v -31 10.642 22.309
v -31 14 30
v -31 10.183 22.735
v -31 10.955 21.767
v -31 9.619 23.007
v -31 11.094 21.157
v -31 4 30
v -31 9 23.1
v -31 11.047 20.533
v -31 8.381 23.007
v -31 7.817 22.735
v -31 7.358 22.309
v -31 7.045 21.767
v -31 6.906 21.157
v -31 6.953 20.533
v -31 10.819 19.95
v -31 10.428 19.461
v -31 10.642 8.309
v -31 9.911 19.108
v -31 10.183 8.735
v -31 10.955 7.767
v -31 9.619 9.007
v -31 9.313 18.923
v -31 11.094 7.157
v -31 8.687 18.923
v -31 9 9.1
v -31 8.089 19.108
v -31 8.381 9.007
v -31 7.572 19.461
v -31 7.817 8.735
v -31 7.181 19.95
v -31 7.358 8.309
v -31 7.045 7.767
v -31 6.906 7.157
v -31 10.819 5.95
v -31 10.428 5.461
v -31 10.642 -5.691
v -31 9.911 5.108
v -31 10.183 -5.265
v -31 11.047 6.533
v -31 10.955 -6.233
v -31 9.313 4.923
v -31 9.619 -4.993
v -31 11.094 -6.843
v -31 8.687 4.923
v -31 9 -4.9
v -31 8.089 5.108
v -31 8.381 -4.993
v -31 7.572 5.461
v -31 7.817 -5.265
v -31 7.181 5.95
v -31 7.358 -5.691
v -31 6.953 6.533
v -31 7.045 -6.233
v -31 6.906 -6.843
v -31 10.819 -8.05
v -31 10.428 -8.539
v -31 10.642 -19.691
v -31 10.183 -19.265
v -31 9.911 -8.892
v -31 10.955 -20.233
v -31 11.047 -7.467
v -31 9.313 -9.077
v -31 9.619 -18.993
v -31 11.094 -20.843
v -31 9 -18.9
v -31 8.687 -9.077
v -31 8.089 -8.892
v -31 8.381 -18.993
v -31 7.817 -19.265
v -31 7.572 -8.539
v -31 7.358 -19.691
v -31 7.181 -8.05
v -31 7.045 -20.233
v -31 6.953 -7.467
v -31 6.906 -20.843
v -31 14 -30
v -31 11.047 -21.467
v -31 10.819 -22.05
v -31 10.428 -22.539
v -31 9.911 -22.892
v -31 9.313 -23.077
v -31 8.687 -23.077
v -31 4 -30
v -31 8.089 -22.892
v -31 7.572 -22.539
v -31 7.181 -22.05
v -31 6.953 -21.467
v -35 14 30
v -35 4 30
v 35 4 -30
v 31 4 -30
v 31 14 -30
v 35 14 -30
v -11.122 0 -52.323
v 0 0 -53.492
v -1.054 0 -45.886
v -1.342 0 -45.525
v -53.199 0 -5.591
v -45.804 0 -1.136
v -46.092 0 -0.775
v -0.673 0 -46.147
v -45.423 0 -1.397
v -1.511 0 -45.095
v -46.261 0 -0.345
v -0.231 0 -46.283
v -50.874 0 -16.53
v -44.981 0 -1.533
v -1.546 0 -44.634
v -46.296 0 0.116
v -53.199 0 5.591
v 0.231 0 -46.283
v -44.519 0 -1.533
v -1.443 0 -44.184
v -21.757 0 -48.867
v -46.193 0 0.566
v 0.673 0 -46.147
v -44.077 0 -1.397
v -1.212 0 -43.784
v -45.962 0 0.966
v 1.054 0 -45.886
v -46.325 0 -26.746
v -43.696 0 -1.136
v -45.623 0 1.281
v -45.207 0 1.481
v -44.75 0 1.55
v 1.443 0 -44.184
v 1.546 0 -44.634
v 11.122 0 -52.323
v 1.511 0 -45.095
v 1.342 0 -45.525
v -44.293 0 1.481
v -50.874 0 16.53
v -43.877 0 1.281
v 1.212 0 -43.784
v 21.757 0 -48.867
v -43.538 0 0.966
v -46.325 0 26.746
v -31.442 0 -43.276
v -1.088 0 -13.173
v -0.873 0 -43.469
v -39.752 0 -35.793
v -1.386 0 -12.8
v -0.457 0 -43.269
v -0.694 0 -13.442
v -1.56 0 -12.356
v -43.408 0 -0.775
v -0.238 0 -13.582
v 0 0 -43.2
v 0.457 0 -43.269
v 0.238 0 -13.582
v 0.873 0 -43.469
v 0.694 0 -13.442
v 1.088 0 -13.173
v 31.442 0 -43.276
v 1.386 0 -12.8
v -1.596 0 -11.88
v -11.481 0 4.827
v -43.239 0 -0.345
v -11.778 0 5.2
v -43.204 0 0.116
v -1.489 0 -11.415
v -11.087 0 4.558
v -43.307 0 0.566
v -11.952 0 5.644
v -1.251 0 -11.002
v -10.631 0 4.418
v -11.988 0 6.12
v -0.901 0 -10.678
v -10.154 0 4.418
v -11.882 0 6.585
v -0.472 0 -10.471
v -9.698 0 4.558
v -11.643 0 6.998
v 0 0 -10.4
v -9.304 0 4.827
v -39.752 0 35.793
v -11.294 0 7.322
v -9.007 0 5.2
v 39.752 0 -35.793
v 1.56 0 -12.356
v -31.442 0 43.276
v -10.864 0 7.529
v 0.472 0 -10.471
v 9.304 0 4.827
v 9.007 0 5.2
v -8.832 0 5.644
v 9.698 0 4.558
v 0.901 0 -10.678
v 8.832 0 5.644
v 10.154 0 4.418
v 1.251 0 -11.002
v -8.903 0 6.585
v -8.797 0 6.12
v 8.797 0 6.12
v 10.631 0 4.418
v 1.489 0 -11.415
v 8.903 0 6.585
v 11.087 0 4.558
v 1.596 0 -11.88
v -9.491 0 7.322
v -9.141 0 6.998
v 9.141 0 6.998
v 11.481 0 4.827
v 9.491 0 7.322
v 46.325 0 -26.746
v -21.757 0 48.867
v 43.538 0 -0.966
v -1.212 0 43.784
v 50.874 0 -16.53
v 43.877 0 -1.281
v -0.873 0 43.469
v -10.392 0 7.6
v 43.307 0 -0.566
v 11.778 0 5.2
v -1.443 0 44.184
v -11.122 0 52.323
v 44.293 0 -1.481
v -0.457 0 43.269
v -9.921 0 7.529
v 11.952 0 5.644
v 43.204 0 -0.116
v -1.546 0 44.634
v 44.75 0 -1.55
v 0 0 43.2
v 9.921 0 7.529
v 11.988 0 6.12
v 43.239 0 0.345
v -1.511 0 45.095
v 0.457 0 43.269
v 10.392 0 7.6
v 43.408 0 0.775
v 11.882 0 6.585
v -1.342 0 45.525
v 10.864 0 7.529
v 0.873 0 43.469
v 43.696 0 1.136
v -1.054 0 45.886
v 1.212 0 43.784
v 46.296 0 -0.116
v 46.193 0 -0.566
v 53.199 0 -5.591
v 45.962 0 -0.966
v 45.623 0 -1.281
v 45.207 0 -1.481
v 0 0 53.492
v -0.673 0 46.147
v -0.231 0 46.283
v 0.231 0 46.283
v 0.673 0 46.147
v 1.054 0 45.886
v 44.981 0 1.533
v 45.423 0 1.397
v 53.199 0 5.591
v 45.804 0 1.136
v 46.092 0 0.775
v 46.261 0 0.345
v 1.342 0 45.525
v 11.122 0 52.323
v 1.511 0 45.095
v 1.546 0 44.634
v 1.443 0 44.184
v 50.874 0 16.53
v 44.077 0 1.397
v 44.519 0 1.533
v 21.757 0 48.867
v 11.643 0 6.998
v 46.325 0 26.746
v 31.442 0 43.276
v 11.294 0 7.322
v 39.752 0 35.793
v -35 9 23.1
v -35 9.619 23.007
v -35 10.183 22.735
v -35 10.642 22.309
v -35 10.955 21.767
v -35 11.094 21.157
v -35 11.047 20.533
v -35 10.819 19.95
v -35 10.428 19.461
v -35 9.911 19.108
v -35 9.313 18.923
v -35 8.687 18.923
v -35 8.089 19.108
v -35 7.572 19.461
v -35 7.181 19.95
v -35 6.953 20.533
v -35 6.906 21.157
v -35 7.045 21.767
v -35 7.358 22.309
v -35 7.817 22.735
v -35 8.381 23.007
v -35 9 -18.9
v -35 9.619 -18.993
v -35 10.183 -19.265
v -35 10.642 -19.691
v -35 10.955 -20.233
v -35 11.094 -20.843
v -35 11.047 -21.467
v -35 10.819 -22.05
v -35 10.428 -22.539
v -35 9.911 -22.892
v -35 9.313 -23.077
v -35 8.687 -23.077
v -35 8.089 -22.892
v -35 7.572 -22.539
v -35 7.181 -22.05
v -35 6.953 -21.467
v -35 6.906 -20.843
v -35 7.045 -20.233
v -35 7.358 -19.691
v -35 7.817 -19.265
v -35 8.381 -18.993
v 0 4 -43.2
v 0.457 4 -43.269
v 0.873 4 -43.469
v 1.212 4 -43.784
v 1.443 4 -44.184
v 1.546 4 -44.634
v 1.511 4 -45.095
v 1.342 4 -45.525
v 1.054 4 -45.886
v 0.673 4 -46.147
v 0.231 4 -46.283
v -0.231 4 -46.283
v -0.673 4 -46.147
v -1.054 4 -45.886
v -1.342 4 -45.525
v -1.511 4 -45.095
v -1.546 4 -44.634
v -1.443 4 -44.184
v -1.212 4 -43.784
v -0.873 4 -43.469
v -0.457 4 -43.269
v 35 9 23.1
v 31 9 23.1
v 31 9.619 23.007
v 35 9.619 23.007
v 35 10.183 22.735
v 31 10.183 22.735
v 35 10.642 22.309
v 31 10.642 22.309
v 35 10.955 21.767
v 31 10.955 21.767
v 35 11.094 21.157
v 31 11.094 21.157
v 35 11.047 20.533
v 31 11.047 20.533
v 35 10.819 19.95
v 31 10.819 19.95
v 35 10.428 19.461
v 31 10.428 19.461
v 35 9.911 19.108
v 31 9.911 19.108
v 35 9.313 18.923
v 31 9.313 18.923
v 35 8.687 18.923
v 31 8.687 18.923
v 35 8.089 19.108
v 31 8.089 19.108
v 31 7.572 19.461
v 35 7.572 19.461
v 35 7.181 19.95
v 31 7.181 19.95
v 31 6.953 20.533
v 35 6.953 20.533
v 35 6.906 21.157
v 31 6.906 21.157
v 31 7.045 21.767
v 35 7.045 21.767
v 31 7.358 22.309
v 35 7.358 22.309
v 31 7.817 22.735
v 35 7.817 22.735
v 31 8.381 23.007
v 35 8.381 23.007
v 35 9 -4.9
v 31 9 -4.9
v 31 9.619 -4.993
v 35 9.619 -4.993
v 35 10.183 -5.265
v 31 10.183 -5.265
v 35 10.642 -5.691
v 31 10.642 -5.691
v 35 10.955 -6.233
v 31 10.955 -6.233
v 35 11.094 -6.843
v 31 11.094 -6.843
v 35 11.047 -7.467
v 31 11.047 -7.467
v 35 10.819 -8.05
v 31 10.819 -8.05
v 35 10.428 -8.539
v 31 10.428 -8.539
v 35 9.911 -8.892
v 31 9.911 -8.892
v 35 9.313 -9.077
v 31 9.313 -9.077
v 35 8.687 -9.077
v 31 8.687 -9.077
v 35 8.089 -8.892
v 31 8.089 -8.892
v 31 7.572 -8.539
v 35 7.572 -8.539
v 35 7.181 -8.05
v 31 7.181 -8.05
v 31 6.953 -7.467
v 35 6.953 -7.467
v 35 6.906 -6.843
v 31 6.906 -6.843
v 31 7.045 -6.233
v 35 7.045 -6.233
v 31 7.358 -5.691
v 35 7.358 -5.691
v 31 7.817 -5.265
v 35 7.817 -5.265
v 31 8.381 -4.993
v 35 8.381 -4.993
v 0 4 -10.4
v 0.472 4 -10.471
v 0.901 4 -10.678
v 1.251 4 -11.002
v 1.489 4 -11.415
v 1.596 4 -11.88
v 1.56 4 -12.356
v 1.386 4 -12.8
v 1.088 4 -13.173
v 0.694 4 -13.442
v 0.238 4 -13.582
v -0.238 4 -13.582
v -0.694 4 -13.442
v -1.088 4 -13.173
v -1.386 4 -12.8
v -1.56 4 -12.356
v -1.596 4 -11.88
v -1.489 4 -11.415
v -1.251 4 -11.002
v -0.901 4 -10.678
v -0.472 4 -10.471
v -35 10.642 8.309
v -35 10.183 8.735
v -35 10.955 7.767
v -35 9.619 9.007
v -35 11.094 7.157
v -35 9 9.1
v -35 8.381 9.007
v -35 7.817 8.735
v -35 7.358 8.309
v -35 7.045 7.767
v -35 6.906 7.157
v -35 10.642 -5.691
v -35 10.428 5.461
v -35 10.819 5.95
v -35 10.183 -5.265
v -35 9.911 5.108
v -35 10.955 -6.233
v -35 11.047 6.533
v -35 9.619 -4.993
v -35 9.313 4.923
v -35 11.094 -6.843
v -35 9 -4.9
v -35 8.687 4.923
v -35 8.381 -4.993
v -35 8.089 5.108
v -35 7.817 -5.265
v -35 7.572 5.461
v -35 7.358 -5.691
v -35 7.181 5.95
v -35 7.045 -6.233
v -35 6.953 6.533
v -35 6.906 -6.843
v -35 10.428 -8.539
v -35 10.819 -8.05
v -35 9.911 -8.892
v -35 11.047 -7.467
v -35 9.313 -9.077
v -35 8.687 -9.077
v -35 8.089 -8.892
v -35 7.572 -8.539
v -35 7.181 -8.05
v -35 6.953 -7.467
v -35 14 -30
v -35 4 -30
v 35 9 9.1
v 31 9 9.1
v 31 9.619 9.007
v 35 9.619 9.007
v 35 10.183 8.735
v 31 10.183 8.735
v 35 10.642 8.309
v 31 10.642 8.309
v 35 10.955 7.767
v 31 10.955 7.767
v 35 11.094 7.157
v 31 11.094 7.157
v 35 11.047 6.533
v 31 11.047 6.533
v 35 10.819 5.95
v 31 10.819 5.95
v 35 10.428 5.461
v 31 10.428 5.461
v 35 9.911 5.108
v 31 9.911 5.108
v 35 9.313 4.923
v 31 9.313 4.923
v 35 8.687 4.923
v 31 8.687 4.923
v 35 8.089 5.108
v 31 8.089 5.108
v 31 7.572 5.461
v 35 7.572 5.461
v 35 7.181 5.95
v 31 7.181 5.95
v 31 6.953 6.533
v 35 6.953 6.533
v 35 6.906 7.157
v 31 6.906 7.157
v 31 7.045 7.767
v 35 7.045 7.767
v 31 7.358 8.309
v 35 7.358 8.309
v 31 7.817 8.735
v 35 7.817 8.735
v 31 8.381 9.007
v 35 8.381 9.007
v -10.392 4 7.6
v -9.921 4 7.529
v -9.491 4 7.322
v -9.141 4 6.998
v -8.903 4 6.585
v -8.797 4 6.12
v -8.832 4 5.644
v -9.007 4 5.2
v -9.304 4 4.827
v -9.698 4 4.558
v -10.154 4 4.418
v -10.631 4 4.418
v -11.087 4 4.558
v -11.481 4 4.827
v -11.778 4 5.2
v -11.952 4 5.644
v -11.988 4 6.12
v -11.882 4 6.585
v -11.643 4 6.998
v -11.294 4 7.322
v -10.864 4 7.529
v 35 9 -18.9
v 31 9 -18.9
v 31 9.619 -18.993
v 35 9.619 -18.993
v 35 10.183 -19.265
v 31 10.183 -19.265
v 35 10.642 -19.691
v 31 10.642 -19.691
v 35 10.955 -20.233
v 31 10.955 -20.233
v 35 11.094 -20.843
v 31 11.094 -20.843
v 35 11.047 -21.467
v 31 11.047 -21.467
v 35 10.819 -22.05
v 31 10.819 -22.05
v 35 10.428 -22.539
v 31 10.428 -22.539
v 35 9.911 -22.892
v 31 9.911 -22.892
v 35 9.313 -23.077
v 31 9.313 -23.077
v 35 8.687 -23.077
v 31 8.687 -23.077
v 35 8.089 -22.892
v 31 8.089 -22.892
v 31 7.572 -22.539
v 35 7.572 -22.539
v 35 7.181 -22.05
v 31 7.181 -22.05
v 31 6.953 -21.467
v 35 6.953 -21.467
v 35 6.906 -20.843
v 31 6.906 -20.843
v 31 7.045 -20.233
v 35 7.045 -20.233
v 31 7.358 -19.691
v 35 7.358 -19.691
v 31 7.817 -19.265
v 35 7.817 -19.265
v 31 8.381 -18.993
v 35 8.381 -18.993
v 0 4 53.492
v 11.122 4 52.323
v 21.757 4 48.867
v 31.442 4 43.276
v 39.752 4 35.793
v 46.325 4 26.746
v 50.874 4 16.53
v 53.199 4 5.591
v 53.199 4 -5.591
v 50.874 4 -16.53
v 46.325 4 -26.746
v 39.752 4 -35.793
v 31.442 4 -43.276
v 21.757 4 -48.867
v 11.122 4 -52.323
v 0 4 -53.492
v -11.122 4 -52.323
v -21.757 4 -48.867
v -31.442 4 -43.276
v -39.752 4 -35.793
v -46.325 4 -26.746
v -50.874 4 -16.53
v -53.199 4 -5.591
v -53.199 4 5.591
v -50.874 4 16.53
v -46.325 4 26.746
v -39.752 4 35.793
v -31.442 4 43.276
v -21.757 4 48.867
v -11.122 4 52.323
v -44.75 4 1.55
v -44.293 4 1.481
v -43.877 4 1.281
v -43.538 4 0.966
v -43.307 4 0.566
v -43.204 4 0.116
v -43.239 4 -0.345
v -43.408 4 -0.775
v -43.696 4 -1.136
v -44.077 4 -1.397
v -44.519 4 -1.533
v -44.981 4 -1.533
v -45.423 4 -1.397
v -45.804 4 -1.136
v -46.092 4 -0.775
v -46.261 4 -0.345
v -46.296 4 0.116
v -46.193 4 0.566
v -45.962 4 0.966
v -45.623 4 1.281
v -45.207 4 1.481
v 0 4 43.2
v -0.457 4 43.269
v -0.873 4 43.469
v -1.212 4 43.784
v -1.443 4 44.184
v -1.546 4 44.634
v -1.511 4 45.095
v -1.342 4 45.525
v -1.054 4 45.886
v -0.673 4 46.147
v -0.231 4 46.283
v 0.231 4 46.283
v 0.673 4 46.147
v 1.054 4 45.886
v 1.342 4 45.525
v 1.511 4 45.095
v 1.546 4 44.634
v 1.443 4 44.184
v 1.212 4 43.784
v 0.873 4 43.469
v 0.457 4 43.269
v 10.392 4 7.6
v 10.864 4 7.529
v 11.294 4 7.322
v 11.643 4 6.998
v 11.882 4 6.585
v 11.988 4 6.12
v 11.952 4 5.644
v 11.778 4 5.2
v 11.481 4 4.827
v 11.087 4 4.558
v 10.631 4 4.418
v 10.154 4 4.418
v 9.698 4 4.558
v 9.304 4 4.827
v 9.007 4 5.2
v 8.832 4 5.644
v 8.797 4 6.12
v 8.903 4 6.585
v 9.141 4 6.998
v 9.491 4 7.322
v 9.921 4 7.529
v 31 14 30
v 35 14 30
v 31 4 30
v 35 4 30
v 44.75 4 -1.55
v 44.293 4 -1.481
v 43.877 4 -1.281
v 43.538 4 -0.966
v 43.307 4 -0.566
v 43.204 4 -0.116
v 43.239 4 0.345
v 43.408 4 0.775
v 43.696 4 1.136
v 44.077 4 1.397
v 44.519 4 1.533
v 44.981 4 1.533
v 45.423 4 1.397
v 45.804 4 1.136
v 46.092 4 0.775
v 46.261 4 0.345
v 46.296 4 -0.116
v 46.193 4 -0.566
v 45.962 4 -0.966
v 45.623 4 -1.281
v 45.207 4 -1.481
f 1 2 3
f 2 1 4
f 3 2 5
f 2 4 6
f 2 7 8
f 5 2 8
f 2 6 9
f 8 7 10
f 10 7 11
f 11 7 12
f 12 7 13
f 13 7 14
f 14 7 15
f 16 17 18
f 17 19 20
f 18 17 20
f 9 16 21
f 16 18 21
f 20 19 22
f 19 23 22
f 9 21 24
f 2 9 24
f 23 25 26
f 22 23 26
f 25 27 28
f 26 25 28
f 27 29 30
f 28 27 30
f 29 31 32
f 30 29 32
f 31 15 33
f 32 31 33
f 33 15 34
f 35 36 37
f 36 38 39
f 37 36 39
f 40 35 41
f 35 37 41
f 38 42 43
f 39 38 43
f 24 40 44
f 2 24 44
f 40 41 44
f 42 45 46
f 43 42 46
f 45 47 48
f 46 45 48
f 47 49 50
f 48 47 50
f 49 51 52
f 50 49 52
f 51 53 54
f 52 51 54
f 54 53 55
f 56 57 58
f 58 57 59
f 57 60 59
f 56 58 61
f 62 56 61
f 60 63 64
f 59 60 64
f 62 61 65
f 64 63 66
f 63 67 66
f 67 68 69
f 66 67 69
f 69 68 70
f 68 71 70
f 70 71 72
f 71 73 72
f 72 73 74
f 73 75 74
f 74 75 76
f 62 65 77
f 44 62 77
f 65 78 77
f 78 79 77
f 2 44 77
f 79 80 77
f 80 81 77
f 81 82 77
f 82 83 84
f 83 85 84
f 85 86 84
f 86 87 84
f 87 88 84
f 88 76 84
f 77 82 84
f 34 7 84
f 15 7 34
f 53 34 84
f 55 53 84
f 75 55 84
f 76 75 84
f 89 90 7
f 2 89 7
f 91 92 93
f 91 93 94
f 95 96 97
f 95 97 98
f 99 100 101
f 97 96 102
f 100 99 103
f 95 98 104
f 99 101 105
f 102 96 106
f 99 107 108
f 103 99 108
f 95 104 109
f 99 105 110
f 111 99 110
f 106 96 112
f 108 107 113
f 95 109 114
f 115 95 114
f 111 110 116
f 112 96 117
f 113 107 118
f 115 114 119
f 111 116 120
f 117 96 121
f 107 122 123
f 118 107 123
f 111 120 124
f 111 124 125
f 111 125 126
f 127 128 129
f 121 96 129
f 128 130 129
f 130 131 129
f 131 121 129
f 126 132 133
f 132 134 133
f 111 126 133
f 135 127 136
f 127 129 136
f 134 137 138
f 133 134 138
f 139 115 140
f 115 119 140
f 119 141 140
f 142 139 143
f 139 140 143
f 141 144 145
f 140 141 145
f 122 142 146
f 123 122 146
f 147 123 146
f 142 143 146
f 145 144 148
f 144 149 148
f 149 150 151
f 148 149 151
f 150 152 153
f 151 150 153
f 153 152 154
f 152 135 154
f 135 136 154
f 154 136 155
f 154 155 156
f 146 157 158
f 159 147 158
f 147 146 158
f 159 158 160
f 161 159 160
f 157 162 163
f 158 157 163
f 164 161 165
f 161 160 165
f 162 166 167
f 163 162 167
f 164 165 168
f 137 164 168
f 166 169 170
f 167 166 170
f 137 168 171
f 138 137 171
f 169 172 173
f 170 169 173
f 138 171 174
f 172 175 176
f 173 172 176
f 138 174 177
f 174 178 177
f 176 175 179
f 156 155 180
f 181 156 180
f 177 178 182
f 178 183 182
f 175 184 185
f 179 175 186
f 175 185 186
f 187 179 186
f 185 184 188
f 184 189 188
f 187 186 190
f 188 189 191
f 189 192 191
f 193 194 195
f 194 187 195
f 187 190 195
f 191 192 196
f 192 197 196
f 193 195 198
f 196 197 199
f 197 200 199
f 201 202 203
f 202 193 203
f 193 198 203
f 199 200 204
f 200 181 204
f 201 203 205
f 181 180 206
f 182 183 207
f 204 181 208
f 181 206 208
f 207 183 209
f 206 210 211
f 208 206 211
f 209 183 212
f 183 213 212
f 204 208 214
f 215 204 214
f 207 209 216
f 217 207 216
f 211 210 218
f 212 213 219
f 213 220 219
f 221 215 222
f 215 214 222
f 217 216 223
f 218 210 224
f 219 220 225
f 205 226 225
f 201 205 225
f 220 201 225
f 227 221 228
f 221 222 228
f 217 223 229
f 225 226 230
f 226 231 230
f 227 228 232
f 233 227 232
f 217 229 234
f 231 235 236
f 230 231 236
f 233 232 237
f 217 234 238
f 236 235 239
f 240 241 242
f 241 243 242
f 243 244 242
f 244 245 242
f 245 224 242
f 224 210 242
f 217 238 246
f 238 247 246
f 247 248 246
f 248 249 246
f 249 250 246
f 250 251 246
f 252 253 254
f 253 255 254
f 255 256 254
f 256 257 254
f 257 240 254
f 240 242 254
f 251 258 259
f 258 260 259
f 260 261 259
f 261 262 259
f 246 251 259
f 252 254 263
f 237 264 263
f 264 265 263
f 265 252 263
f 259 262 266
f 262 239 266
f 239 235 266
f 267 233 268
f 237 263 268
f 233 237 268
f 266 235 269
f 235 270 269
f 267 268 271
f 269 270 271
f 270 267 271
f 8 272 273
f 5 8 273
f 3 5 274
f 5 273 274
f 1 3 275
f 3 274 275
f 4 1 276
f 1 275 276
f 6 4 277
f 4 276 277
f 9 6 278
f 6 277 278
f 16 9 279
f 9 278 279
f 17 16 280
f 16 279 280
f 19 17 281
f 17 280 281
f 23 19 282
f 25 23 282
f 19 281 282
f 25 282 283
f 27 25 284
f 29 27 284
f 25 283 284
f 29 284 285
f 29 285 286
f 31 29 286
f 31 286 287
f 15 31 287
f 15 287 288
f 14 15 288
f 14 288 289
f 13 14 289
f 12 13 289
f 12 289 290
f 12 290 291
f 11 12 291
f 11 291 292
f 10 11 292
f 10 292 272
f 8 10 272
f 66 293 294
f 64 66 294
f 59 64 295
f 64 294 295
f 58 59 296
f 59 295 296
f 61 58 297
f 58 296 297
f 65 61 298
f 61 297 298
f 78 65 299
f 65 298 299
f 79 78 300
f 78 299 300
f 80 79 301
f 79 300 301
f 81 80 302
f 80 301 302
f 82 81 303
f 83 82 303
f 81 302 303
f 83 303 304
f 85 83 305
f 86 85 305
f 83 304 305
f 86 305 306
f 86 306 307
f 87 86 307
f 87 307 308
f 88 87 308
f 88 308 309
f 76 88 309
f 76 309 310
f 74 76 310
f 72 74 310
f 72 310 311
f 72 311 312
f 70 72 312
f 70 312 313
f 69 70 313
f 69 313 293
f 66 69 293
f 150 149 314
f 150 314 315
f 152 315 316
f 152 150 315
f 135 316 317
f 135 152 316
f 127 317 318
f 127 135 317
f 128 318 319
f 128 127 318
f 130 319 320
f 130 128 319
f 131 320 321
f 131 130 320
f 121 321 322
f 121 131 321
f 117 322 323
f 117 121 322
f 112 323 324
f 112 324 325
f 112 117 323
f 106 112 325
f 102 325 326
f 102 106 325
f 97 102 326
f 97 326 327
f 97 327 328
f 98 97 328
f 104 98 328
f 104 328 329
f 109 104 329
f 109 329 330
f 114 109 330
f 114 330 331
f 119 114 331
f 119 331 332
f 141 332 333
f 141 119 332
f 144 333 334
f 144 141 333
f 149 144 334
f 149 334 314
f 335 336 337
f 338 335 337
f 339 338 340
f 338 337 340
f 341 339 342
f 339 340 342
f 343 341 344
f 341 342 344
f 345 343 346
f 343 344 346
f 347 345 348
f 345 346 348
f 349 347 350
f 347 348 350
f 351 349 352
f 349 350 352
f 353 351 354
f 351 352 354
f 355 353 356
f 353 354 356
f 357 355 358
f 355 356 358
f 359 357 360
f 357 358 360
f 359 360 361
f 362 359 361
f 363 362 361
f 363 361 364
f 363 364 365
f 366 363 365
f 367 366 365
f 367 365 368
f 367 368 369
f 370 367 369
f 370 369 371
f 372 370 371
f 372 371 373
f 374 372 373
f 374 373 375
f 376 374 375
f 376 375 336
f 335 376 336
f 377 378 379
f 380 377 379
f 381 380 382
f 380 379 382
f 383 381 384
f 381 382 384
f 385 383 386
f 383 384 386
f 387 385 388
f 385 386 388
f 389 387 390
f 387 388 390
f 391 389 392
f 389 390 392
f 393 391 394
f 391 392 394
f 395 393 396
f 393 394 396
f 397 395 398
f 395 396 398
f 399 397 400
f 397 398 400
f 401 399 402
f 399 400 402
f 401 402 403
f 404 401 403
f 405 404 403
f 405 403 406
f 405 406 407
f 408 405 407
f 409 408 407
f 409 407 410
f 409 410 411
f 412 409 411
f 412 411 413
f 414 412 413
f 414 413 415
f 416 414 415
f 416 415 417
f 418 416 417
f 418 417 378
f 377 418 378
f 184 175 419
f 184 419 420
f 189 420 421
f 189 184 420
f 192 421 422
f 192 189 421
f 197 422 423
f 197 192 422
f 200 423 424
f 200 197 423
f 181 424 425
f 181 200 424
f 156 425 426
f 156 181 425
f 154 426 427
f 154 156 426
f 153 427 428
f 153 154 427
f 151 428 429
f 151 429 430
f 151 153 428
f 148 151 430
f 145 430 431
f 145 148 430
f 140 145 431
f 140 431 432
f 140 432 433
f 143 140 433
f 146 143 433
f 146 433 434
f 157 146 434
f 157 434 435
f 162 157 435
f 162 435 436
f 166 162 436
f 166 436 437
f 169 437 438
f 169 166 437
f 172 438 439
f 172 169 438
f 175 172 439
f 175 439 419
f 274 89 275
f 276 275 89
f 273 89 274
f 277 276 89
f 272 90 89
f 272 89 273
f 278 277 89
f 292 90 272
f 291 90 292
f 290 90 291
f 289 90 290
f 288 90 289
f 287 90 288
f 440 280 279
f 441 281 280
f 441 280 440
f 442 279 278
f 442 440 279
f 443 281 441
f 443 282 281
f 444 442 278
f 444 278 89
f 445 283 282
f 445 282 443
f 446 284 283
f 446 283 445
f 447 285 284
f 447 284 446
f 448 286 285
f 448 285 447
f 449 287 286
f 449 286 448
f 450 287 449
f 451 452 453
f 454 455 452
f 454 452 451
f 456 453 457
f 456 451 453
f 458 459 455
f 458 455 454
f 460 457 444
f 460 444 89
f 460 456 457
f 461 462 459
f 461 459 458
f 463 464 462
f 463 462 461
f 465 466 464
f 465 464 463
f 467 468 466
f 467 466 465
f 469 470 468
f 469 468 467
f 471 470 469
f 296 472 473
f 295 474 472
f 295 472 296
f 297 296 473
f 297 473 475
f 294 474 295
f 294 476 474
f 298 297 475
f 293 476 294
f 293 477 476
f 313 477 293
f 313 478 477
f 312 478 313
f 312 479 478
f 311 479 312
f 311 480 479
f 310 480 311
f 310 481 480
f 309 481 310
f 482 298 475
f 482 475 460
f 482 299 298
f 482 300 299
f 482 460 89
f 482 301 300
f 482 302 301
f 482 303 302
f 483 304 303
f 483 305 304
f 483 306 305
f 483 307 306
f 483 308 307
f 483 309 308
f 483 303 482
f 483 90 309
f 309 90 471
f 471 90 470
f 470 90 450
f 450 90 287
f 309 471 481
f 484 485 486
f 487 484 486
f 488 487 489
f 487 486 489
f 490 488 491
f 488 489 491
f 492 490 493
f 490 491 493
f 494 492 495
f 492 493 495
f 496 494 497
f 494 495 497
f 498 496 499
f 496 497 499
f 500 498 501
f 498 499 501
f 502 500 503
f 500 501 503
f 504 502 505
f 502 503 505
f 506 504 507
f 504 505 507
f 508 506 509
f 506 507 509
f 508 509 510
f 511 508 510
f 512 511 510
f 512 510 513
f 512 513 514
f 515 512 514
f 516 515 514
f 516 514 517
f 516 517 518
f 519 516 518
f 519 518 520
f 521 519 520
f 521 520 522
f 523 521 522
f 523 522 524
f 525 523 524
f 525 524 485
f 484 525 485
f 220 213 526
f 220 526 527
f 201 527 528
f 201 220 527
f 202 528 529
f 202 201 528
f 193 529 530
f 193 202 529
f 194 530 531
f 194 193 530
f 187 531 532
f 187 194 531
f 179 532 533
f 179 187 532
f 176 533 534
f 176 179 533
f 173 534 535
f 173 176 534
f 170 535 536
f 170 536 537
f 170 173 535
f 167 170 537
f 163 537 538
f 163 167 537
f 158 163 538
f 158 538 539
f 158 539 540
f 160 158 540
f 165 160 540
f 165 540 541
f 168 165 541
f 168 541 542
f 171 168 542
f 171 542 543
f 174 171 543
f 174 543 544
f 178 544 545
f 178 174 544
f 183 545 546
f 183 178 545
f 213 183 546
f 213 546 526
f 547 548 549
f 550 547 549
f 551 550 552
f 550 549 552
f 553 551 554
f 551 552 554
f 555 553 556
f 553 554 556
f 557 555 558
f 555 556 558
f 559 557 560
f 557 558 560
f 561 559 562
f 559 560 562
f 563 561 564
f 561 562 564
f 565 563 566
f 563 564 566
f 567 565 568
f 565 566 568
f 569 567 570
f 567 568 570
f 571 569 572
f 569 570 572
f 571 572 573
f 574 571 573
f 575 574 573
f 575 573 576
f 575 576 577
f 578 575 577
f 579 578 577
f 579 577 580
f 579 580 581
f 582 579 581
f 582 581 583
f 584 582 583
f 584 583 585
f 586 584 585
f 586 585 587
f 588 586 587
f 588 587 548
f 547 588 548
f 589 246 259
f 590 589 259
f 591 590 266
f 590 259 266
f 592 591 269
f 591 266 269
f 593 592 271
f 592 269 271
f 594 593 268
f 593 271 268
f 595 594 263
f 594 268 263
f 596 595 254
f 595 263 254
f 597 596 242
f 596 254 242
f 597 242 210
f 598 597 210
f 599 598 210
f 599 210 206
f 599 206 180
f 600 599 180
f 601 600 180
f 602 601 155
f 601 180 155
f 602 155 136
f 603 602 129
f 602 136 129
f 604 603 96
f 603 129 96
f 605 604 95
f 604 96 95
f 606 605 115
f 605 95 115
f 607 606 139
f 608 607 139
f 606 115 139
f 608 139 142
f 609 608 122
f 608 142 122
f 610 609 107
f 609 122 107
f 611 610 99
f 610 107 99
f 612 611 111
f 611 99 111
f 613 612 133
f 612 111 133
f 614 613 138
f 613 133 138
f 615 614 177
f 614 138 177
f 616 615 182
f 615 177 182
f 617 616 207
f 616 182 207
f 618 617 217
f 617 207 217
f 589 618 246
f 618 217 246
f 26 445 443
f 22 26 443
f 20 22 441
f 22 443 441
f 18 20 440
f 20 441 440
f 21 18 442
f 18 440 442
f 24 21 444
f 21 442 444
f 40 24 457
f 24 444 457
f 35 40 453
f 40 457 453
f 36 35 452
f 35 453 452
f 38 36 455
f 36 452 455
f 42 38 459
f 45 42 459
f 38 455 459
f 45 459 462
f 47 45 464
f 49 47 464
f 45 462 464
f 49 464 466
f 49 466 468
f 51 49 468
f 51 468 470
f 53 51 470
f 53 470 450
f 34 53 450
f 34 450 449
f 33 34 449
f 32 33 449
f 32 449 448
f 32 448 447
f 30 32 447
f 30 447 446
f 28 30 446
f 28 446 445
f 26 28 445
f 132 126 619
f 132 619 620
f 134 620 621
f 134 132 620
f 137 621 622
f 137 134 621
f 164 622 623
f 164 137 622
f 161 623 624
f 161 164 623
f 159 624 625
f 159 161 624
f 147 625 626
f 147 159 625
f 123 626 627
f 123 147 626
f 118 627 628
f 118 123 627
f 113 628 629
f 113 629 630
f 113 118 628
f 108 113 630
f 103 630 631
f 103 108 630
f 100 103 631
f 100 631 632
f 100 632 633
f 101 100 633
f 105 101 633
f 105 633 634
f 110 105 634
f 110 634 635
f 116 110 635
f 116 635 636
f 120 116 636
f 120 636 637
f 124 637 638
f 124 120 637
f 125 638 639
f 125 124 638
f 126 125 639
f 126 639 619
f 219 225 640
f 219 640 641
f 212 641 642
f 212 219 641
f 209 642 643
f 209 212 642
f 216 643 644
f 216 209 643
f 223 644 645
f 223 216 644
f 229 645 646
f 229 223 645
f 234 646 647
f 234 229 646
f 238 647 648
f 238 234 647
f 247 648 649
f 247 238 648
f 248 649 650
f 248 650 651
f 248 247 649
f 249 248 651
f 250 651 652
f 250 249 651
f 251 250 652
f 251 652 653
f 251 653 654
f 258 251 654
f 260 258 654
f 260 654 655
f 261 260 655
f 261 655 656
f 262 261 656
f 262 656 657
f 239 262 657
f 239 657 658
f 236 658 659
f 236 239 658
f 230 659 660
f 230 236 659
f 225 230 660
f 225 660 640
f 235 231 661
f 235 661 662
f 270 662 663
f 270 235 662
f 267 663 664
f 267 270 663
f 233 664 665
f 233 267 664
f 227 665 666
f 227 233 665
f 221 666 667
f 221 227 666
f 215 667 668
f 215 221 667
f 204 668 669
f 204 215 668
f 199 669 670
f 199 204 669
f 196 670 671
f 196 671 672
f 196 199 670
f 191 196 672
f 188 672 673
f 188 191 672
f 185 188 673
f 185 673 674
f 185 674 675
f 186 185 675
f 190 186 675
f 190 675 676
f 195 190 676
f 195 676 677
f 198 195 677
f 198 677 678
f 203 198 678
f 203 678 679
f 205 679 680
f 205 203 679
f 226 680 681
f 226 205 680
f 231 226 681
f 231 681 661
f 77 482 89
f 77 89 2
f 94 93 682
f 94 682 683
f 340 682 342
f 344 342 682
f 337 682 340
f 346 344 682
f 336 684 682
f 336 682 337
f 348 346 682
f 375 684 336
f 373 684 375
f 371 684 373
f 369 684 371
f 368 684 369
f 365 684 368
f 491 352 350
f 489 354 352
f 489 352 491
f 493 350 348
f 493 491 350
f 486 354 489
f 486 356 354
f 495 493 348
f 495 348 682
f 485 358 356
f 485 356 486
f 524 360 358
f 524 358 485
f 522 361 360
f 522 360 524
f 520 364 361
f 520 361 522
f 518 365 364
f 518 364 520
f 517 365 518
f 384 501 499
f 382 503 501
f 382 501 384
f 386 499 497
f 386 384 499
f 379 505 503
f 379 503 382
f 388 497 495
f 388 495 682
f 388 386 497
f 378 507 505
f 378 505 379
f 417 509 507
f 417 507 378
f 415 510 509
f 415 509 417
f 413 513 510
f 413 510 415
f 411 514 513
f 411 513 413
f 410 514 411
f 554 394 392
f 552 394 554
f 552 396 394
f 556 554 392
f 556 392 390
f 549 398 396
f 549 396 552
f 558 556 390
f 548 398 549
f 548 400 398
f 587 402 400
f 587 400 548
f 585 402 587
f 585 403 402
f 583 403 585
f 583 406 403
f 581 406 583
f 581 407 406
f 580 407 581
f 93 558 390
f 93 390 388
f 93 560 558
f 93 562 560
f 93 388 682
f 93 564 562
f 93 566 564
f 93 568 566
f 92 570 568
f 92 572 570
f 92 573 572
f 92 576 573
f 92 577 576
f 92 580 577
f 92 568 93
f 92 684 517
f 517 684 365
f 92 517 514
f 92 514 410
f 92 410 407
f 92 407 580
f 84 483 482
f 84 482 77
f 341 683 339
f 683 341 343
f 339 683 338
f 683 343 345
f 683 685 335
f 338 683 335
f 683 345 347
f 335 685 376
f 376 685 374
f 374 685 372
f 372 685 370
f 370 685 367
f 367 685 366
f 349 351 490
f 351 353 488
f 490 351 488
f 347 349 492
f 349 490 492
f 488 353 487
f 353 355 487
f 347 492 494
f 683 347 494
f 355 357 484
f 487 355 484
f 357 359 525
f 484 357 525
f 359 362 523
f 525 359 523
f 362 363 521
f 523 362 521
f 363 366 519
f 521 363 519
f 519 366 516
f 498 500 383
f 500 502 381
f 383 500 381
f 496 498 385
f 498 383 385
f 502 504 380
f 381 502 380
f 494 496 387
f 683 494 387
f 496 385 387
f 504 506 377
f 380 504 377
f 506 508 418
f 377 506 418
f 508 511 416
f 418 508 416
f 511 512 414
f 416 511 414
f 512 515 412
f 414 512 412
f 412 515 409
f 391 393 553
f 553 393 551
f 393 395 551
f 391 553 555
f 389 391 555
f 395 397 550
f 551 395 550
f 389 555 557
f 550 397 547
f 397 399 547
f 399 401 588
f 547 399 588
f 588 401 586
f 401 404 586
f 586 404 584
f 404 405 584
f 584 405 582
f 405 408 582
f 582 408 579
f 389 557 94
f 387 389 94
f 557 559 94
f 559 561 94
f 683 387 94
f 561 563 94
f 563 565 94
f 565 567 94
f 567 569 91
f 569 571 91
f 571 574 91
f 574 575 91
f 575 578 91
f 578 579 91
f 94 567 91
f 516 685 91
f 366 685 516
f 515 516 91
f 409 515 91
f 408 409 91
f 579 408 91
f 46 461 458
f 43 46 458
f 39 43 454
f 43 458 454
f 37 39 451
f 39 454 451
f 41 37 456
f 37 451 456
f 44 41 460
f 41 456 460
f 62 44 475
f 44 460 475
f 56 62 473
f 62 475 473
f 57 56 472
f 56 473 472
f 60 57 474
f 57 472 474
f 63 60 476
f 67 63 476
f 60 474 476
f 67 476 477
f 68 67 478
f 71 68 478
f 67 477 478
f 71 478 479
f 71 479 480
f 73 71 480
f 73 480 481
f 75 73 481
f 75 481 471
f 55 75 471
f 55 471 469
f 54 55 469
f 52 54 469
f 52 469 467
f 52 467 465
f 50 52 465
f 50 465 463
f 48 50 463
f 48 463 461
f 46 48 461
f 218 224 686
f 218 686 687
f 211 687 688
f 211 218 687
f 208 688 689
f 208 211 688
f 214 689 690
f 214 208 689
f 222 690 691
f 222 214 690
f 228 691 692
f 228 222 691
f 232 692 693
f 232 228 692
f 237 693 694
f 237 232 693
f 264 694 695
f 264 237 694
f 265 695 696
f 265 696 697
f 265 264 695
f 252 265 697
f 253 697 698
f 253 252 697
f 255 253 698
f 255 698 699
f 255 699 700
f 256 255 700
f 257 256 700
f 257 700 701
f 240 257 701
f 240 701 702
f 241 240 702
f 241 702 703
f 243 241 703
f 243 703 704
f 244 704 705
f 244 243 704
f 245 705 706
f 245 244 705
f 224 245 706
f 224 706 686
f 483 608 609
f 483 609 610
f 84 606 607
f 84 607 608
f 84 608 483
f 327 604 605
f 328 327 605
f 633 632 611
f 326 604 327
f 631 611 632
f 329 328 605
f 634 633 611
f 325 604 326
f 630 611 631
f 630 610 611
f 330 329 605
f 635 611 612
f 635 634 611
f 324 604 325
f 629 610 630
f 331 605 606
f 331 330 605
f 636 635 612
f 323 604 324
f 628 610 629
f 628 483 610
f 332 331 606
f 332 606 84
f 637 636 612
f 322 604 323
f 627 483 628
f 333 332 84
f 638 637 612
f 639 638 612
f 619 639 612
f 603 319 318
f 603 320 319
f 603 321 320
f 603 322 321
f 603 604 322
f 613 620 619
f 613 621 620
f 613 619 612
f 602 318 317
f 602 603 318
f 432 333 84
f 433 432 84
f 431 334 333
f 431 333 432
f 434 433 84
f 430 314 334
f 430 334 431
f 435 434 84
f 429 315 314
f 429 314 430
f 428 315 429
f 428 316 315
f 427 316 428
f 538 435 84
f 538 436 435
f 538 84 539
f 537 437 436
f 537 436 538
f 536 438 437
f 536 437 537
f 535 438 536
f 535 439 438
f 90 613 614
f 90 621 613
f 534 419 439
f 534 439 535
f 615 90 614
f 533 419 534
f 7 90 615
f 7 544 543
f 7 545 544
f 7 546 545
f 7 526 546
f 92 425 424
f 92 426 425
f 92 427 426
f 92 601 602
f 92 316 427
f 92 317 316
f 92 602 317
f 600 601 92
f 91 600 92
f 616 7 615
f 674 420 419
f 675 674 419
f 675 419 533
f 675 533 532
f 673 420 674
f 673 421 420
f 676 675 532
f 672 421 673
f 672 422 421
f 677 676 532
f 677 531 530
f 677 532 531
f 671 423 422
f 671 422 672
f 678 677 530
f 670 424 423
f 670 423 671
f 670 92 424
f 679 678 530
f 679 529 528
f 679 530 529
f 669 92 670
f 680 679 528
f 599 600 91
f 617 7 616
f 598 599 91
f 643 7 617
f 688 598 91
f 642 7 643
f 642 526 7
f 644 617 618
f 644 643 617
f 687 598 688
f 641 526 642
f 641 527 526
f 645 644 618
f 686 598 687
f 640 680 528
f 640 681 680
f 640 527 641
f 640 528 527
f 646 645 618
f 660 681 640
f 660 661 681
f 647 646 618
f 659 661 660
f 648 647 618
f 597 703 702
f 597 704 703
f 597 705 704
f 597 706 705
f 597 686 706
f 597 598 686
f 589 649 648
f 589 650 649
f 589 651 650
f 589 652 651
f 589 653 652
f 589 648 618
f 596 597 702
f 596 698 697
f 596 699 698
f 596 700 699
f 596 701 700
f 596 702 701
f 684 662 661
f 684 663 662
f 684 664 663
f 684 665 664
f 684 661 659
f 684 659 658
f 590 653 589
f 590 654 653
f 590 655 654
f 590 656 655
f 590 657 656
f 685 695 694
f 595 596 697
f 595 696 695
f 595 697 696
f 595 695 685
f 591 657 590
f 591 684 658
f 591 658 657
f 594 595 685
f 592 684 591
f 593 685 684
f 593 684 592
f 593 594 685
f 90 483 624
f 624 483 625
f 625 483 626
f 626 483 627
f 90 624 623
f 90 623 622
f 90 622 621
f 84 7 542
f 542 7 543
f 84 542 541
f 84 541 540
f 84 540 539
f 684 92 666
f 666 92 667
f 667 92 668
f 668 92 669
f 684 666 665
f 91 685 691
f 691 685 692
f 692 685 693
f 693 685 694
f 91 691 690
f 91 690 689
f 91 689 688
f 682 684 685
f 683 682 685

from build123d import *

# Parameters (mm, degrees)
SKETCH_1_R             = 53.491930893
SKETCH_1_R_2           = 1.55
SKETCH_1_R_3           = 1.6
EXTRUDE_563_DEPTH      = 4
SKETCH_2_W             = 4
SKETCH_2_H             = 60
EXTRUDE_829_DEPTH      = 10
SKETCH_3_R             = 2.1
CUT_EXTRUDE_1129_DEPTH = 105.346578783


with BuildPart() as part:
    # 草图1 → Extrude 563 (new body)
    with BuildSketch(Plane(origin=(0, 0, 0), x_dir=(1, 0, 0), z_dir=(0, 1, 0))):
        with Locations(Location((0, 0, 0), (0, 0, 270))):
            Circle(SKETCH_1_R)
        with Locations(Location((0, 44.75, 0), (0, 0, 270))):
            Circle(SKETCH_1_R_2, mode=Mode.SUBTRACT)
        with Locations(Location((-44.75, 0, 0), (0, 0, 270))):
            Circle(SKETCH_1_R_2, mode=Mode.SUBTRACT)
        with Locations(Location((44.75, 0, 0), (0, 0, 90))):
            Circle(SKETCH_1_R_2, mode=Mode.SUBTRACT)
        with Locations(Location((0, -44.75, 0), (0, 0, 90))):
            Circle(SKETCH_1_R_2, mode=Mode.SUBTRACT)
        with Locations(Location((0, 12, 0), (0, 0, 270))):
            Circle(SKETCH_1_R_3, mode=Mode.SUBTRACT)
        with Locations(Location((10.392304845, -6, 0), (0, 0, 270))):
            Circle(SKETCH_1_R_3, mode=Mode.SUBTRACT)
        with Locations(Location((-10.392304845, -6, 0), (0, 0, 270))):
            Circle(SKETCH_1_R_3, mode=Mode.SUBTRACT)
    extrude(amount=EXTRUDE_563_DEPTH)

    # 草图2 → Extrude 829 (add)
    with BuildSketch(Plane(origin=(0, 4, 0), x_dir=(1, 0, 0), z_dir=(0, 1, 0))):
        with Locations((33, 0)):
            Rectangle(SKETCH_2_W, SKETCH_2_H)
        with Locations((-33, 0)):
            Rectangle(SKETCH_2_W, SKETCH_2_H)
    extrude(amount=EXTRUDE_829_DEPTH)

    # 草图3 → Cut-Extrude 1129 (cut, through all)
    with BuildSketch(Plane.ZY.offset(35)):
        with Locations((7, 9)):
            Circle(SKETCH_3_R)
        with Locations((-7, 9)):
            Circle(SKETCH_3_R)
        with Locations((-21, 9)):
            Circle(SKETCH_3_R)
        with Locations((21, 9)):
            Circle(SKETCH_3_R)
    extrude(amount=-CUT_EXTRUDE_1129_DEPTH, mode=Mode.SUBTRACT)


solid = part.part
